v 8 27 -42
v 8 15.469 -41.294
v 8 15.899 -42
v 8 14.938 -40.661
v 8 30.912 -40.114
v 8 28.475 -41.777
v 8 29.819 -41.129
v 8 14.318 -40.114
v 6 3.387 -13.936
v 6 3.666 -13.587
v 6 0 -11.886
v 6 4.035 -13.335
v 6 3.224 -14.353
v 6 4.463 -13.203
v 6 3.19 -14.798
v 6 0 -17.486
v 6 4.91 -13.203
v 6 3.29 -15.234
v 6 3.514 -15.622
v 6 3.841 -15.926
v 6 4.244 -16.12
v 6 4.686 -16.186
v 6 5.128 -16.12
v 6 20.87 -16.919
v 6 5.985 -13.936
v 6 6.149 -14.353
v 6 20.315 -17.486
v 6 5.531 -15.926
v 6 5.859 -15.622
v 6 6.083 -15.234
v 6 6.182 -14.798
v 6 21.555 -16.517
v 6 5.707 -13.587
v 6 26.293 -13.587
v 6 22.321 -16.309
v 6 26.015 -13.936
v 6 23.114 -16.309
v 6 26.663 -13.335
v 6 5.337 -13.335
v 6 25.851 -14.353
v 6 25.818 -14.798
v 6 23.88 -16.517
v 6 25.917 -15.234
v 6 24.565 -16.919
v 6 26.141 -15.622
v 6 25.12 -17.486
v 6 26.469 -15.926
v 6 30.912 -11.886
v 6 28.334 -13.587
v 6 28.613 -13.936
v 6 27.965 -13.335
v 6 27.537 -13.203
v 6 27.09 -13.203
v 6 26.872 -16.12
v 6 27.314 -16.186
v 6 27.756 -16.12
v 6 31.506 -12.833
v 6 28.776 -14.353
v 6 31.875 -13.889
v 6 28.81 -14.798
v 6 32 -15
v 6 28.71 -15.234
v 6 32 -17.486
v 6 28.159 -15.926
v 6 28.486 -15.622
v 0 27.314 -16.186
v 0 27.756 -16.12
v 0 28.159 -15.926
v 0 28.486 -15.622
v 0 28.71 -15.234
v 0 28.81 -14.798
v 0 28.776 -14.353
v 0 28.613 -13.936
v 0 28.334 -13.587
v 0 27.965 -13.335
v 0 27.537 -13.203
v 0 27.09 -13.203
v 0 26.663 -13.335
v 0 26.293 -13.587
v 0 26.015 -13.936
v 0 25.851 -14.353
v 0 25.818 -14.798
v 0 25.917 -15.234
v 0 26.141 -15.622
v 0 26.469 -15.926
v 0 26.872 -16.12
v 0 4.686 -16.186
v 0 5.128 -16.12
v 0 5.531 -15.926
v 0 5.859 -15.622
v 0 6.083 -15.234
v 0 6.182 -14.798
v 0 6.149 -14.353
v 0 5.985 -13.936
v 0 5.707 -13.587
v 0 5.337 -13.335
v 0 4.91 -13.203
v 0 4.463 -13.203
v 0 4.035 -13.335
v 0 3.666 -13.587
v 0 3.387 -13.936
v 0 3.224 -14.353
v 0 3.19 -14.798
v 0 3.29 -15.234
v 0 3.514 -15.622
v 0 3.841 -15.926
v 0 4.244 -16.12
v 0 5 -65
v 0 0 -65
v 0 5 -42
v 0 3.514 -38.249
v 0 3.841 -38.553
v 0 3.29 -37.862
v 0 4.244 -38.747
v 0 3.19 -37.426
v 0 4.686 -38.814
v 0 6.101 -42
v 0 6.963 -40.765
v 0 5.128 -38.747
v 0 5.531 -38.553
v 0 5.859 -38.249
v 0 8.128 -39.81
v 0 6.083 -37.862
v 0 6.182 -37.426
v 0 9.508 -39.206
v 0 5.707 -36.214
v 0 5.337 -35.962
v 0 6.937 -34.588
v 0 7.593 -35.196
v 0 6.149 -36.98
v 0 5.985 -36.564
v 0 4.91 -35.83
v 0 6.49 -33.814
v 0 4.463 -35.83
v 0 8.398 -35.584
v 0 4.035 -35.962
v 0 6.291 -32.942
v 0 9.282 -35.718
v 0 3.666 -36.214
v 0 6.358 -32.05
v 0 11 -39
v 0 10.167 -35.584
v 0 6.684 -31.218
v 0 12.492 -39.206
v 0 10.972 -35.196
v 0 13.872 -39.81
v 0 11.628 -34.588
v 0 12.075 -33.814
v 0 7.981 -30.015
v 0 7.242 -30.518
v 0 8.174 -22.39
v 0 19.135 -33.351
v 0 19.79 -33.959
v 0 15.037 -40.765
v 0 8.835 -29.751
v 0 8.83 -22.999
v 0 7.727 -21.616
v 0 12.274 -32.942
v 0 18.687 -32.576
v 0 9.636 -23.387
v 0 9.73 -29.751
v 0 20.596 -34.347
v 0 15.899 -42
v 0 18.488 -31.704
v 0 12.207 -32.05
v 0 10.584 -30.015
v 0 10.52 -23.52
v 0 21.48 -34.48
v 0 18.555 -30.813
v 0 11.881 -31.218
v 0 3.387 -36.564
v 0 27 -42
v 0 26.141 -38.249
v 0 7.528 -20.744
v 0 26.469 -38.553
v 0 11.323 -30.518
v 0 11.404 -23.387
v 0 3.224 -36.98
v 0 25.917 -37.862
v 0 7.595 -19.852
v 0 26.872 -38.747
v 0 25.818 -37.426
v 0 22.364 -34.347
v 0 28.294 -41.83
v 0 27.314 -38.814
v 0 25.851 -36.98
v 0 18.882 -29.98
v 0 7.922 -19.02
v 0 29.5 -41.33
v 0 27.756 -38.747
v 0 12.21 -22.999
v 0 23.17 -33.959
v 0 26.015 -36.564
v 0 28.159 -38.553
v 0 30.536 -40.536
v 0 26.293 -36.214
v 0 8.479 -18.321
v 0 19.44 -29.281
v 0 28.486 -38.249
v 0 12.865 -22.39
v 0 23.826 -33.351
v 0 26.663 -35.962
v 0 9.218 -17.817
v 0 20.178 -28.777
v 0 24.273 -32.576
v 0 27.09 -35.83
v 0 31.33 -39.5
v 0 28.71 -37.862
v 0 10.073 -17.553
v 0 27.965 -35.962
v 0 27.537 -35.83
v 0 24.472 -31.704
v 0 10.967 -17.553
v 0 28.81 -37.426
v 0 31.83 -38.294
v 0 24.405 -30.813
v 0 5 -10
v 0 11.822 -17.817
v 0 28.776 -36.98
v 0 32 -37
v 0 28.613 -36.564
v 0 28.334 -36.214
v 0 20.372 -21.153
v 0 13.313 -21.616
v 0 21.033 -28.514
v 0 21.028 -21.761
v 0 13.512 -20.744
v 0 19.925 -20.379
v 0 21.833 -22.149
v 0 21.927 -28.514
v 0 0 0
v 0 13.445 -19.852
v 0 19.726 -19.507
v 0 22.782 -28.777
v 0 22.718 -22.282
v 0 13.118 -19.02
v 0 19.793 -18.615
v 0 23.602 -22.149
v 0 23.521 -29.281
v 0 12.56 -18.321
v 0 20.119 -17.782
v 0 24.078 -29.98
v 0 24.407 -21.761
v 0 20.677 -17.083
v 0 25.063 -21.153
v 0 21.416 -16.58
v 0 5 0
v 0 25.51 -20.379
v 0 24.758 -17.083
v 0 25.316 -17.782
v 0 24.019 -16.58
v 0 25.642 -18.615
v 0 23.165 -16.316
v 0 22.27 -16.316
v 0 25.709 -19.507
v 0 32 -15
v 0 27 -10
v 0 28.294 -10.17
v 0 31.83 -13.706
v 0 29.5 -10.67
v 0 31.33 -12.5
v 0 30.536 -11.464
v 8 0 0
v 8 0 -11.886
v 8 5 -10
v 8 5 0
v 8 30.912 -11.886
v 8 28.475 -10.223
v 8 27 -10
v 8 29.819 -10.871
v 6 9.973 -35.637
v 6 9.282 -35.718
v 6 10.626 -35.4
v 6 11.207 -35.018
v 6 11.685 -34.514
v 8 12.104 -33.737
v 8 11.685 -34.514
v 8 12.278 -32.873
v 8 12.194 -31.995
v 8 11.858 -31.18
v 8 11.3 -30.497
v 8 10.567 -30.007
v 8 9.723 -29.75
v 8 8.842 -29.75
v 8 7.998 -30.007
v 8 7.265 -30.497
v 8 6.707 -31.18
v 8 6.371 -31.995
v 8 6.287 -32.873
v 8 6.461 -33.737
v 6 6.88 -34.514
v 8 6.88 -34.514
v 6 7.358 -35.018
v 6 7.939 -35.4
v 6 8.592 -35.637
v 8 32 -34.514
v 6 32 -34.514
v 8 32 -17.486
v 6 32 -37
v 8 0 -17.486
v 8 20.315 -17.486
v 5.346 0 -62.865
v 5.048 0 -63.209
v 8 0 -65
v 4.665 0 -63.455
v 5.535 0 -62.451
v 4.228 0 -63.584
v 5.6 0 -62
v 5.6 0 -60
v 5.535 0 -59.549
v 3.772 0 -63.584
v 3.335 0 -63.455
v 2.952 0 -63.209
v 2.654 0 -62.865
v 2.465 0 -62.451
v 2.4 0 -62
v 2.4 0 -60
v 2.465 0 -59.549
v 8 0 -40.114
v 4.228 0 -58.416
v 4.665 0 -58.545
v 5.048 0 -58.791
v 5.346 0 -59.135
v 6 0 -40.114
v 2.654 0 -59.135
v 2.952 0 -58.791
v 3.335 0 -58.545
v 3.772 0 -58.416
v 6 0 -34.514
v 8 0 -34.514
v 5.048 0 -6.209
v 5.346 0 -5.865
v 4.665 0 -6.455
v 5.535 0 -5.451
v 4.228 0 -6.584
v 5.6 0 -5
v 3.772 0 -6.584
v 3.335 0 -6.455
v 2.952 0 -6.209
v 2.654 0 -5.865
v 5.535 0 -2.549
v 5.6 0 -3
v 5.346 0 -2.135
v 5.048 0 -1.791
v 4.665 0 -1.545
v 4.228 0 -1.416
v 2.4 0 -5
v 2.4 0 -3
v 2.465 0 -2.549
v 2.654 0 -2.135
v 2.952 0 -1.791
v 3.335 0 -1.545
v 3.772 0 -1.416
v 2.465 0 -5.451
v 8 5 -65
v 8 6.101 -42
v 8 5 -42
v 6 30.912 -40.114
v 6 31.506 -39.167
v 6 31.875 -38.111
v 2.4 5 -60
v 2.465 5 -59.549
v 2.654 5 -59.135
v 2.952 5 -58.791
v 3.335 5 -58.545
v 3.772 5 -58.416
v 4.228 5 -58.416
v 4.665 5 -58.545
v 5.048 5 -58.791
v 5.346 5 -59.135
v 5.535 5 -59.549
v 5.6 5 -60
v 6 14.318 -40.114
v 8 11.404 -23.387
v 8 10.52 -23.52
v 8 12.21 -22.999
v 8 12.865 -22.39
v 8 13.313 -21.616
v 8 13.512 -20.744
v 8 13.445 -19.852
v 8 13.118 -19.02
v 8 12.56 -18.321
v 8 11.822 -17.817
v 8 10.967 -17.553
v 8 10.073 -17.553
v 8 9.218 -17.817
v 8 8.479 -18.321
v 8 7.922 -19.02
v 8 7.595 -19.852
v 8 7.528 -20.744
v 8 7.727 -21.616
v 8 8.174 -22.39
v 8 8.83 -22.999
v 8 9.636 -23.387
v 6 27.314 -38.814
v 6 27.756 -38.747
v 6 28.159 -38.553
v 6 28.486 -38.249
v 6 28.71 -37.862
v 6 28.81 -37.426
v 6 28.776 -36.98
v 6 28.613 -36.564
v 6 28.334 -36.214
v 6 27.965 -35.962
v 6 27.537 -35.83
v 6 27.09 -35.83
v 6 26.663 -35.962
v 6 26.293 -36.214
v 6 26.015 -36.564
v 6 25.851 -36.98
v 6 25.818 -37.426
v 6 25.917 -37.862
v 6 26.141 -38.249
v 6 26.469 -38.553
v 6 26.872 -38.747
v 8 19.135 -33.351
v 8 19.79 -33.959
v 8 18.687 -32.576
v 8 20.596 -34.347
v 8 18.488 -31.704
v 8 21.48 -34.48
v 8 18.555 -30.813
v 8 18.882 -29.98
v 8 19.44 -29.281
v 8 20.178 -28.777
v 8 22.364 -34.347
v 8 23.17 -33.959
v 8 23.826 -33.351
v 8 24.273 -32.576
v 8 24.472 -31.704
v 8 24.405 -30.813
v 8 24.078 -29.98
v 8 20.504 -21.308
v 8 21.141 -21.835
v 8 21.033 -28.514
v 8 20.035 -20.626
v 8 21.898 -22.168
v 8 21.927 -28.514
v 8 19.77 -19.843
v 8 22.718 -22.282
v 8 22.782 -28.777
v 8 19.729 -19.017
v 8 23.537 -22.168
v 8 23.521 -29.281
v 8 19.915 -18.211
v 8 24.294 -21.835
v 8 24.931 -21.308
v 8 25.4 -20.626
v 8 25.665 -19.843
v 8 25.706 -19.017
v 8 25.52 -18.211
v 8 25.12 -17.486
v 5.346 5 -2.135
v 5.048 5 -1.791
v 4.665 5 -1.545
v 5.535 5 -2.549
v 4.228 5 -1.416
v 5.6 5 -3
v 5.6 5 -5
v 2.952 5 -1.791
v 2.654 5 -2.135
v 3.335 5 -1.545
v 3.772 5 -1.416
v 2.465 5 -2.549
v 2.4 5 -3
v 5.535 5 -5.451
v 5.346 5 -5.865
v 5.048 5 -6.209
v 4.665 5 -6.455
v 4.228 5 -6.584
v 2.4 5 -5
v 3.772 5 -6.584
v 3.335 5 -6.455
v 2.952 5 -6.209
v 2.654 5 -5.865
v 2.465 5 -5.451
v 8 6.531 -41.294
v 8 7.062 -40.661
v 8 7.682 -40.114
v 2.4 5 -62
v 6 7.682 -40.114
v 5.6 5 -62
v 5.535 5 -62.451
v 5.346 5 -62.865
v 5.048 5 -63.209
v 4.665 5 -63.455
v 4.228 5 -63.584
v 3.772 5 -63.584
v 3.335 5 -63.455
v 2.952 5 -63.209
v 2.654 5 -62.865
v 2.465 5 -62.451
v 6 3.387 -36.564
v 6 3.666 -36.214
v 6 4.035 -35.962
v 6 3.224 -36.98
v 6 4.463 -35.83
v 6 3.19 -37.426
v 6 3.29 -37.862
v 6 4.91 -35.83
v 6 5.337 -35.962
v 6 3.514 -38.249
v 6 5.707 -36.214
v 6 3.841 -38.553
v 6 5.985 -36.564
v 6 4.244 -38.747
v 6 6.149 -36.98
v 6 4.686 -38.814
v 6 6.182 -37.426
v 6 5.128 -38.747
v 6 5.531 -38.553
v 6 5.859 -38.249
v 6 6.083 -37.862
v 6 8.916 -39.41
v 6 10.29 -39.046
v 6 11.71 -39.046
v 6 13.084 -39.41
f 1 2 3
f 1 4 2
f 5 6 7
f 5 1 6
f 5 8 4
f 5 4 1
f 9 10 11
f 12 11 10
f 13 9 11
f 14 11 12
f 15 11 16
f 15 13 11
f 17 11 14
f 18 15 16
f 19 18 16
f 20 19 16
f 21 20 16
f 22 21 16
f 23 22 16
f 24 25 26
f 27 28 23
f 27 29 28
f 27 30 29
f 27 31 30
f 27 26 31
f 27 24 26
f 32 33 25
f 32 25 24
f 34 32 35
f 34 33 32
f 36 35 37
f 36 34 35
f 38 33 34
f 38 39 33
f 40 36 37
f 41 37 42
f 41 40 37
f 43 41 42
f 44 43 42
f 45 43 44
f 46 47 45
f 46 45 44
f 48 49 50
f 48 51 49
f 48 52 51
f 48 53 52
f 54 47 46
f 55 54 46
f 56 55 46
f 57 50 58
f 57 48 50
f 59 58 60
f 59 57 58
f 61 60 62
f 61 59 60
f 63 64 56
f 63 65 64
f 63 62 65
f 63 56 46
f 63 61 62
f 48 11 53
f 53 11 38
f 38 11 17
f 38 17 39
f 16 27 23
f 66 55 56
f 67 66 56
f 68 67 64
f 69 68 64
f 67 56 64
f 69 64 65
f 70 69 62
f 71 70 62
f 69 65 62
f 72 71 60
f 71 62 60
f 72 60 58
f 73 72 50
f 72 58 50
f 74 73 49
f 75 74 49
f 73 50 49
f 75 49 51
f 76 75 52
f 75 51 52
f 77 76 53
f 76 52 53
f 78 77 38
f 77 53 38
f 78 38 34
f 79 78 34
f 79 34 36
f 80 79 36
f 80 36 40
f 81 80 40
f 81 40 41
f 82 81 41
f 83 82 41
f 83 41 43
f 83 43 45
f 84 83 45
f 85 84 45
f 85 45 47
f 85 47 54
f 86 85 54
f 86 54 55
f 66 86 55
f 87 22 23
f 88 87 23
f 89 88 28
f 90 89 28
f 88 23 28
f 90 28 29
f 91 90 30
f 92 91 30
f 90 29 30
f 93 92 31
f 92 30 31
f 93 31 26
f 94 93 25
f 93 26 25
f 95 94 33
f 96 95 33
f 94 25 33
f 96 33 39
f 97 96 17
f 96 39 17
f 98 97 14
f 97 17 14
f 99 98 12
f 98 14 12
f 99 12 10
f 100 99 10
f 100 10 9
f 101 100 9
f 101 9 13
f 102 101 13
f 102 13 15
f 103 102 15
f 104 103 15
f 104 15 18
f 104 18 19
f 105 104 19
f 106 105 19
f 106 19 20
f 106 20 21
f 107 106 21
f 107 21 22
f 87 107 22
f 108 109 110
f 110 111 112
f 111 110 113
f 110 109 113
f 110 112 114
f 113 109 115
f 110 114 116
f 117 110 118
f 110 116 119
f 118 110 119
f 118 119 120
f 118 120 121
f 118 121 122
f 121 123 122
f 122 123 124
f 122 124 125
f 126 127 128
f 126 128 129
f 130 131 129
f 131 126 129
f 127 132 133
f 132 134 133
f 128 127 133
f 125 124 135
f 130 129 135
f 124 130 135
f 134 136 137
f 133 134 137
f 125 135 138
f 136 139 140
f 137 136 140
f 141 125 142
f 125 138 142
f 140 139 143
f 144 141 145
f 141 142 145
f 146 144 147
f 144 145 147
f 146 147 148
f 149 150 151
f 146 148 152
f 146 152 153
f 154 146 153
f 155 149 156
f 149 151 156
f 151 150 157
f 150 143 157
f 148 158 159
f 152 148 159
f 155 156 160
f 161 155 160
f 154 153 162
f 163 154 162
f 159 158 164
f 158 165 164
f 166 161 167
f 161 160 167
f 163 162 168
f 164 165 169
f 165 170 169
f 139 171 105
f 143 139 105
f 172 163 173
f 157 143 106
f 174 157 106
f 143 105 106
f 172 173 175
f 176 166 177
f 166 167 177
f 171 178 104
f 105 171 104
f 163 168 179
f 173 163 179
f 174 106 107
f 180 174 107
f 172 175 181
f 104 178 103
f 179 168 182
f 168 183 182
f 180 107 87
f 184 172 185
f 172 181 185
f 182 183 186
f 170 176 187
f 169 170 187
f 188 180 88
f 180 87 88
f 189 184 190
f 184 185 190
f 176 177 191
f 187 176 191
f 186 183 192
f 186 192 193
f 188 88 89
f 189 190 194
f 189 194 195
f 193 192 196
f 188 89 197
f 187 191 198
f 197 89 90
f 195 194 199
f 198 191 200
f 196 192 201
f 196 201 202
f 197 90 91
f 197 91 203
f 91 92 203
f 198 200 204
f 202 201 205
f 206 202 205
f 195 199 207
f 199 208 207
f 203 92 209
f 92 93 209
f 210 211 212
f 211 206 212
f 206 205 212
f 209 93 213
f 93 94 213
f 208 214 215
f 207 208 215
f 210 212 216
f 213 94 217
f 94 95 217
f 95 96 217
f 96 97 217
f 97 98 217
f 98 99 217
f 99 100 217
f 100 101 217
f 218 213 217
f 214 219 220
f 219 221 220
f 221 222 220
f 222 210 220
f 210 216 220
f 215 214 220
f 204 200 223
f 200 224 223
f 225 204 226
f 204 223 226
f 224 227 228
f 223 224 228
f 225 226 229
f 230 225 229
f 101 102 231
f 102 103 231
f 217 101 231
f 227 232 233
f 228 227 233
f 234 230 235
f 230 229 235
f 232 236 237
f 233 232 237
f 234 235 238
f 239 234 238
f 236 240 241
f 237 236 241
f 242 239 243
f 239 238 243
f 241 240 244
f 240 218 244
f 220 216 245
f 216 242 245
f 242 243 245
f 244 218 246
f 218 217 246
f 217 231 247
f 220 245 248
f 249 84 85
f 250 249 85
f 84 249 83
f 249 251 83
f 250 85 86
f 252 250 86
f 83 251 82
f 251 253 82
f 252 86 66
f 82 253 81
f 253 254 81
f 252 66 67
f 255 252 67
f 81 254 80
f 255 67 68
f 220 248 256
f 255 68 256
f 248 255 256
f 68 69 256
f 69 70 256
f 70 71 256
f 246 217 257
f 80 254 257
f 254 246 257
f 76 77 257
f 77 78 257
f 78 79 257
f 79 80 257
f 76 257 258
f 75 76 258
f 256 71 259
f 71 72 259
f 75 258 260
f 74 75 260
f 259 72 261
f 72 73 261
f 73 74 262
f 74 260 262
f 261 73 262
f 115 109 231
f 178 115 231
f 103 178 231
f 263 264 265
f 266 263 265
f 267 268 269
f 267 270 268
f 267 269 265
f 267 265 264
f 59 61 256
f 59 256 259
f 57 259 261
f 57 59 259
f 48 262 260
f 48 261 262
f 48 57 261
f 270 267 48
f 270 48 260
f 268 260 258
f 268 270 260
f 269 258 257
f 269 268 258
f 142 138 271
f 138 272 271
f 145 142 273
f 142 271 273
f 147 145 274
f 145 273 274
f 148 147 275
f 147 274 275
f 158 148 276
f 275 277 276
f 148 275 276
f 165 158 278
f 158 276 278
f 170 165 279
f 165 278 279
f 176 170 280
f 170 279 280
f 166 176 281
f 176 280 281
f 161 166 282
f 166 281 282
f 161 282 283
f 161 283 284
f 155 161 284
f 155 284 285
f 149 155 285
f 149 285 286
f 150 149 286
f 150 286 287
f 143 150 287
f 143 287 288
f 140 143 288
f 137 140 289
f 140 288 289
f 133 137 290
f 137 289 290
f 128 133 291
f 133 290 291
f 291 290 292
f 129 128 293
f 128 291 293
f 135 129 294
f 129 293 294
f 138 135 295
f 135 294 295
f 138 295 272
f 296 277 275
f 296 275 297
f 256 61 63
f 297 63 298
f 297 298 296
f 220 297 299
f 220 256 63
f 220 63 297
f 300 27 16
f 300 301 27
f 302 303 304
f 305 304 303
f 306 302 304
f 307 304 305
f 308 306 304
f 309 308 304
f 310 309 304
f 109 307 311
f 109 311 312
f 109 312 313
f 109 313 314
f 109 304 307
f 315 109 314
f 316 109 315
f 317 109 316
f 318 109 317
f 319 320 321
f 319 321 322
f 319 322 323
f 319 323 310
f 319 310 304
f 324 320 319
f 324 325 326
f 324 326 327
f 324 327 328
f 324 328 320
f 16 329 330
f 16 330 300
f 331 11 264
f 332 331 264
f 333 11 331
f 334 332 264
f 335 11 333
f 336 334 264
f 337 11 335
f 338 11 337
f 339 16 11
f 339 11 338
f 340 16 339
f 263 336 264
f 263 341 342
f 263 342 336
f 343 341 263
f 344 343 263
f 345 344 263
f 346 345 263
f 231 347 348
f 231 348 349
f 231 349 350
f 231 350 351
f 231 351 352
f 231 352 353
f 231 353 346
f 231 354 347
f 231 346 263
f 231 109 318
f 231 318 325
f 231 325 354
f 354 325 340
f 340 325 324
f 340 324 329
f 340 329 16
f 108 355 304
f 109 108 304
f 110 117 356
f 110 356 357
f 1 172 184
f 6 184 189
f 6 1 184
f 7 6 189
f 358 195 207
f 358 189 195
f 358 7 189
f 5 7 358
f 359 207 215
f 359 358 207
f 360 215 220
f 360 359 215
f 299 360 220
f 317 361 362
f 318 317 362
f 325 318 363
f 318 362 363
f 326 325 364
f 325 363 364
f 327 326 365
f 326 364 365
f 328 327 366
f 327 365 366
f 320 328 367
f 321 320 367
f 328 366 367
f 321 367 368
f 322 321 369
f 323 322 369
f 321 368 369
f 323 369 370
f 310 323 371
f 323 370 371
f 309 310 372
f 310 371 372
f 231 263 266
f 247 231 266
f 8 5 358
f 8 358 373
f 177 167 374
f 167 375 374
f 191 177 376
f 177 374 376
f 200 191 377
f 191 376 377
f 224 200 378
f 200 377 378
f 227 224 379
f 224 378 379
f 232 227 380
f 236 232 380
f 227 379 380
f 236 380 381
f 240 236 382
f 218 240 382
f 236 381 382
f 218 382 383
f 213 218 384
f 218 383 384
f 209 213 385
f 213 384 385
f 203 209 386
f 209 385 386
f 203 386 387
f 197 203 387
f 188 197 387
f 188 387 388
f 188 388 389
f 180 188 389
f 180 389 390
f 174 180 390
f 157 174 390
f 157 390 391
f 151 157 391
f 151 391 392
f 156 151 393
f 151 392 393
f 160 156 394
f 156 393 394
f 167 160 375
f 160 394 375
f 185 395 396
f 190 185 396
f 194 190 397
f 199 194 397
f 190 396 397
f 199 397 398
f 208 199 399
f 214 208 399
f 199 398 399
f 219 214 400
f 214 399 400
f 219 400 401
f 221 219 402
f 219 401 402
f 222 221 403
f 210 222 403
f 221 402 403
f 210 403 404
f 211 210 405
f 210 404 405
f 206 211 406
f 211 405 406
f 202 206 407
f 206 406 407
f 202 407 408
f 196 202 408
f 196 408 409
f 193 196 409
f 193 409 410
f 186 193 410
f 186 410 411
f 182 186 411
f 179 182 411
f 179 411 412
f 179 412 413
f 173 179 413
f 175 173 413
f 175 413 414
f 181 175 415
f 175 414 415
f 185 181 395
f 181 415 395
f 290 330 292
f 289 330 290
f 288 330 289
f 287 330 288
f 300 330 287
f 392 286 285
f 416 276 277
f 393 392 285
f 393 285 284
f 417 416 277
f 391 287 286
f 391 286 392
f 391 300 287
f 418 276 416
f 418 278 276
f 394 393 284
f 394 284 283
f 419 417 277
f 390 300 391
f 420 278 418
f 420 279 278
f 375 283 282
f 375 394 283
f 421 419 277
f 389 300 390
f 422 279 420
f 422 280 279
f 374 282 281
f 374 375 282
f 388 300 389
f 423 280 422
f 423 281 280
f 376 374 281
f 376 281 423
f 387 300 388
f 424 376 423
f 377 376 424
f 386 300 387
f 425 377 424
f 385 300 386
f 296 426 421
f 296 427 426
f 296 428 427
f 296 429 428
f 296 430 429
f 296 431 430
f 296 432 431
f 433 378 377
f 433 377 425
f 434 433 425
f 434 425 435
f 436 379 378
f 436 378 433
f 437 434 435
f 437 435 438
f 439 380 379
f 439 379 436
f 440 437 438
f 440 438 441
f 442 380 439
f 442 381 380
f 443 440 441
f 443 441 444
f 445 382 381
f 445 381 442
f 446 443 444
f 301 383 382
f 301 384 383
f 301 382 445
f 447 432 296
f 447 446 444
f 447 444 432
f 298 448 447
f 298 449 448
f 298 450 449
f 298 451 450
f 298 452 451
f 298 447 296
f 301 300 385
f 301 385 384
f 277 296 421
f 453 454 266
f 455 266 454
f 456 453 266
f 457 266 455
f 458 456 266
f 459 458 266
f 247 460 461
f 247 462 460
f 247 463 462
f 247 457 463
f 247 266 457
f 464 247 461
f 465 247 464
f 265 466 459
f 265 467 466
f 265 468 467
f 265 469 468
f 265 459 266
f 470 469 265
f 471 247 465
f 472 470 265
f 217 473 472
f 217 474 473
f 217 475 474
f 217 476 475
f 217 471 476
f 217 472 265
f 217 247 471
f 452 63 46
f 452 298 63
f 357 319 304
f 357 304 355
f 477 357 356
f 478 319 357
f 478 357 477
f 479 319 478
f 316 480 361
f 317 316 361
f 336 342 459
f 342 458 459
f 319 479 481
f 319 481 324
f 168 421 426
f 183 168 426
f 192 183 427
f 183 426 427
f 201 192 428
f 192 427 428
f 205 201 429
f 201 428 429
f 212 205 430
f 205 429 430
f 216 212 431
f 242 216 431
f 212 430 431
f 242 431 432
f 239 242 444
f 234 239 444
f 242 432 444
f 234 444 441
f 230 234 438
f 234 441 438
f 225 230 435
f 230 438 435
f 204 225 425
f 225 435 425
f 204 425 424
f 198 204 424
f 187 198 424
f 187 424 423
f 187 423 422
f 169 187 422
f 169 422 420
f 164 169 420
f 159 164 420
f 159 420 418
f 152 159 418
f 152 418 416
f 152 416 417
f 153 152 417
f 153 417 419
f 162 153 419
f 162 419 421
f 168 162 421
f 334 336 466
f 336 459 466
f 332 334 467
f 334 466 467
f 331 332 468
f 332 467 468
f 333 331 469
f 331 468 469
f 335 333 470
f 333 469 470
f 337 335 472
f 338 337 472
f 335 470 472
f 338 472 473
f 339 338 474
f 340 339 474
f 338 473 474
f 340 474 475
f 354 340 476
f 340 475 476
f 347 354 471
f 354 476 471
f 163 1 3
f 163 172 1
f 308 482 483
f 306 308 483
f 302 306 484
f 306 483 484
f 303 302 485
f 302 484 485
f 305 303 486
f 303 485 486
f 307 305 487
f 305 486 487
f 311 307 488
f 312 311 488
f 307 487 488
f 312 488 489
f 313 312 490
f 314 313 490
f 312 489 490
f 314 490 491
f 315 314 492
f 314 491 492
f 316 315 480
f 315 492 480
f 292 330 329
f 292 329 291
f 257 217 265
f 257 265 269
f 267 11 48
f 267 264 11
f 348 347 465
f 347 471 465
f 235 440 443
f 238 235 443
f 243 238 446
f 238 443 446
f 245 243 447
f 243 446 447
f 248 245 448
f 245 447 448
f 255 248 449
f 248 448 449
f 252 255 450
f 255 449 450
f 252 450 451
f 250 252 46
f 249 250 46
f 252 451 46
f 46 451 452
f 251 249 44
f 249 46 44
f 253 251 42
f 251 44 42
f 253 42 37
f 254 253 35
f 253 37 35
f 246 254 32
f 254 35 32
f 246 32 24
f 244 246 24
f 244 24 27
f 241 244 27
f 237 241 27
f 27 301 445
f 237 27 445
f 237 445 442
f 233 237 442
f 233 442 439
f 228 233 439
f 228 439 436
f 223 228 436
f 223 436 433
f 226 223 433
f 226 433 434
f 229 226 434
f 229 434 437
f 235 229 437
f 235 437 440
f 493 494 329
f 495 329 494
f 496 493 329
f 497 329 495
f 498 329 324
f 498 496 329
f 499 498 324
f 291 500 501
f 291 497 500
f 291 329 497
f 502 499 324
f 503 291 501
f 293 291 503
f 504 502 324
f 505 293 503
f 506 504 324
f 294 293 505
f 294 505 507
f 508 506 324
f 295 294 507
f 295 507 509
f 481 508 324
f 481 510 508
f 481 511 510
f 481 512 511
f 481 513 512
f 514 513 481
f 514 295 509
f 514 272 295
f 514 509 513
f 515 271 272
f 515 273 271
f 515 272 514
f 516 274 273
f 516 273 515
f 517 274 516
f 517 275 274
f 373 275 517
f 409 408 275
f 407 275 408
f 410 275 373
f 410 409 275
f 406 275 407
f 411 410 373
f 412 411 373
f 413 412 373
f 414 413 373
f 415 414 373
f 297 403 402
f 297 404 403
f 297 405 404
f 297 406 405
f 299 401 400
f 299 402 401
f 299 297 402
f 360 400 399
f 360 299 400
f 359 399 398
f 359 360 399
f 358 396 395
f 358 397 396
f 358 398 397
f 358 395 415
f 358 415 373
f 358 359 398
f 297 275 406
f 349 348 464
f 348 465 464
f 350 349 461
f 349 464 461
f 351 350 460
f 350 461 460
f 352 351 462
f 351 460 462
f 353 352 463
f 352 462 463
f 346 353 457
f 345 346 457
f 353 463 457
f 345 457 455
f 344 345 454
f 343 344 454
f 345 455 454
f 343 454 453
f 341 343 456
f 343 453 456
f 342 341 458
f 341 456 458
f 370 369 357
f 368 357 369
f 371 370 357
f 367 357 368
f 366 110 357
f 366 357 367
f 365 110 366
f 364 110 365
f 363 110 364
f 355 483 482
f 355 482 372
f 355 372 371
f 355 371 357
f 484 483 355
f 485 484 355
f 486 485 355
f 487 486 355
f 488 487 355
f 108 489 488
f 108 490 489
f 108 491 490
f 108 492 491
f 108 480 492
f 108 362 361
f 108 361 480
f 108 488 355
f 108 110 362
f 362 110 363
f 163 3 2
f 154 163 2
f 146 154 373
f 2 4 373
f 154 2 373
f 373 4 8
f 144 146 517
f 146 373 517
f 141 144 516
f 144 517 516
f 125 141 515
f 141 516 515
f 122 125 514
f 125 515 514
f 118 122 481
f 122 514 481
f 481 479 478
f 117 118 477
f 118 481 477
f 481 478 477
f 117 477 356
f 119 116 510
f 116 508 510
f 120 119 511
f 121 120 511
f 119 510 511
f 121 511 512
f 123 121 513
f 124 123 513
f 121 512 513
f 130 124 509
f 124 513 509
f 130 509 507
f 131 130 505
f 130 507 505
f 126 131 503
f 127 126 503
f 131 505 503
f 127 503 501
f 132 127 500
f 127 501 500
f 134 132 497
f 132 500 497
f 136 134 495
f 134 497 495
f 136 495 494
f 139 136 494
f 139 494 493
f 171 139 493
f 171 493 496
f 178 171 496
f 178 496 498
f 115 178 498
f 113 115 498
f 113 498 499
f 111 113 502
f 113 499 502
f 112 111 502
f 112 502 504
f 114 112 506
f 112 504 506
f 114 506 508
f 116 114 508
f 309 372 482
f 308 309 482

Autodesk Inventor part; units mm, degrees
ref_plane "YZ Plane" through (0, 0, 0) normal (1, 0, 0) x (0, 1, 0)
ref_plane "XZ Plane" through (0, 0, 0) normal (0, 1, 0) x (-1, 0, 0)
ref_plane "XY Plane" through (0, 0, 0) normal (0, 0, 1) x (1, 0, 0)
sketch "Esquisse1" plane through (0, 0, 0) normal (1, 0, 0) x (0, 1, 0)
  line L0 (0, 0) -> (5, 0)
  line L1 (5, 0) -> (5, -10)
  line L2 (5, -10) -> (32, -10)
  line L3 (32, -10) -> (32, -42)
  line L4 (32, -42) -> (5, -42)
  line L5 (5, -42) -> (5, -65)
  line L6 (5, -65) -> (0, -65)
  line L7 (0, -65) -> (0, 0)
  dimension "d0" = 5
  dimension "d1" = 32
  dimension "d2" = 32
  dimension "d3" = 10
  dimension "d4" = 65
extrude "Extrusion1" add sketch "Esquisse1" along normal blind 8
sketch "Esquisse2" plane through (8, 0, 0) normal (1, 0, 0) x (0, 0, -1)
  circle A0 centre (26, 16) radius 9.5 construction
  line L0 (0, 0) -> (65, 0) projected
  line L1 (10, 32) -> (10, 5) projected
  line L2 (26, 16) -> (19.2825, 22.7175) construction
  circle A1 centre (26, 16) radius 7.75 construction
  line L3 (26, 16) -> (20.5199, 10.5199) construction
  circle A2 centre (19.2825, 22.7175) radius 3
  circle A3 centre (20.5199, 10.5199) radius 3
  circle A4 centre (31.4801, 21.4801) radius 3
  circle A5 centre (32.7175, 9.2825) radius 3
  dimension "d9" = 19
  dimension "d7" = 16
  dimension "d8" = 16
  dimension "d10" = 45
  dimension "d11" = 15.5
  dimension "d12" = 45
  dimension "d13" = 6
  dimension "d14" = 6
  dimension "d31" = 360
  dimension "d35" = 360
extrude "Extrusion2" cut sketch "Esquisse2" against normal through all
sketch "Esquisse3" plane through (8, 0, 0) normal (1, 0, 0) x (0, 0, -1)
  circle A0 centre (26, 16) radius 16 construction
  line L0 (10, 32) -> (10, 5) projected
  line L1 (0, 0) -> (65, 0) projected
  line L2 (26, 16) -> (14.6863, 27.3137) construction
  line L3 (42, 32) -> (10, 32) projected
  circle A1 centre (14.6863, 27.3137) radius 1.5
  circle A2 centre (14.6863, 4.6863) radius 1.5
  circle A3 centre (37.3137, 4.6863) radius 1.5
  circle A4 centre (37.3137, 27.3137) radius 1.5
  dimension "d17" = 32
  dimension "d18" = 16
  dimension "d19" = 16
  dimension "d20" = 45
  dimension "d21" = 3
  dimension "d24" = 360
extrude "Extrusion3" cut sketch "Esquisse3" against normal through all
fillet "Congé1" radius 5 2 edges at (4, 32, -10) (4, 32, -42)
sketch "Esquisse4" plane through (0, 5, 0) normal (0, 1, 0) x (1, 0, 0)
  line L0 (4, 5) -> (4, 3) construction
  line L1 (2.4, 5) -> (2.4, 3)
  line L2 (5.6, 3) -> (5.6, 5)
  arc A0 (5.6, 5) -> (2.4, 5) centre (4, 5) ccw
  arc A1 (2.4, 3) -> (5.6, 3) centre (4, 3) ccw
  line L3 (0, 0) -> (8, 0) projected
  line L4 (0, 10) -> (0, 0) projected
  point P0 (4, 4)
  dimension "d37" = 3
  dimension "d38" = 2
  dimension "d39" = 4
  dimension "d40" = 1.6
extrude "Extrusion4" cut sketch "Esquisse4" against normal through all
pattern_linear "Réseau rectangulaire1" count 2 spacing 57 along (0, 0, -1) of "Extrusion4"
sketch "Esquisse5" plane through (8, 0, 0) normal (1, 0, 0) x (0, 0, -1)
  line L0 (11.8863, 37.0839) -> (17.4863, 37.0839)
  line L1 (17.4863, 37.0839) -> (17.4863, -4.5812)
  line L2 (17.4863, -4.5812) -> (11.8863, -4.5812)
  line L3 (11.8863, -4.5812) -> (11.8863, 37.0839)
  circle A0 centre (14.6863, 27.3137) radius 1.5 projected
  line L4 (34.5137, 38.7224) -> (40.1137, 38.7224)
  line L5 (40.1137, 38.7224) -> (40.1137, -5.31)
  line L6 (40.1137, -5.31) -> (34.5137, -5.31)
  line L7 (34.5137, -5.31) -> (34.5137, 38.7224)
  circle A1 centre (37.3137, 27.3137) radius 1.5 projected
  point P0 (0, 0)
  dimension "d47" = 2.8
  dimension "d48" = 5.6
  dimension "d49" = 2.8
  dimension "d50" = 5.6
extrude "Extrusion5" cut sketch "Esquisse5" against normal blind 2 contours L0 L1 L2 L3 | L4 L5 L6 L7 | A1
sketch "Esquisse6" plane through (8, 0, 0) normal (1, 0, 0) x (0, 0, -1)
  circle A0 centre (44.5, 11) radius 5.5
  line L0 (10, 27) -> (10, 5) projected
  line L1 (40.1137, 0) -> (11.8863, 0) projected
  point P0 (0, 0)
  point P1 (10, 7)
  point P2 (63, 0)
  dimension "d53" = 34.5
  dimension "d54" = 11
  dimension "d55" = 11
extrude "Extrusion6" cut sketch "Esquisse6" against normal through all
properties part number "support_moteur_brushless2"
